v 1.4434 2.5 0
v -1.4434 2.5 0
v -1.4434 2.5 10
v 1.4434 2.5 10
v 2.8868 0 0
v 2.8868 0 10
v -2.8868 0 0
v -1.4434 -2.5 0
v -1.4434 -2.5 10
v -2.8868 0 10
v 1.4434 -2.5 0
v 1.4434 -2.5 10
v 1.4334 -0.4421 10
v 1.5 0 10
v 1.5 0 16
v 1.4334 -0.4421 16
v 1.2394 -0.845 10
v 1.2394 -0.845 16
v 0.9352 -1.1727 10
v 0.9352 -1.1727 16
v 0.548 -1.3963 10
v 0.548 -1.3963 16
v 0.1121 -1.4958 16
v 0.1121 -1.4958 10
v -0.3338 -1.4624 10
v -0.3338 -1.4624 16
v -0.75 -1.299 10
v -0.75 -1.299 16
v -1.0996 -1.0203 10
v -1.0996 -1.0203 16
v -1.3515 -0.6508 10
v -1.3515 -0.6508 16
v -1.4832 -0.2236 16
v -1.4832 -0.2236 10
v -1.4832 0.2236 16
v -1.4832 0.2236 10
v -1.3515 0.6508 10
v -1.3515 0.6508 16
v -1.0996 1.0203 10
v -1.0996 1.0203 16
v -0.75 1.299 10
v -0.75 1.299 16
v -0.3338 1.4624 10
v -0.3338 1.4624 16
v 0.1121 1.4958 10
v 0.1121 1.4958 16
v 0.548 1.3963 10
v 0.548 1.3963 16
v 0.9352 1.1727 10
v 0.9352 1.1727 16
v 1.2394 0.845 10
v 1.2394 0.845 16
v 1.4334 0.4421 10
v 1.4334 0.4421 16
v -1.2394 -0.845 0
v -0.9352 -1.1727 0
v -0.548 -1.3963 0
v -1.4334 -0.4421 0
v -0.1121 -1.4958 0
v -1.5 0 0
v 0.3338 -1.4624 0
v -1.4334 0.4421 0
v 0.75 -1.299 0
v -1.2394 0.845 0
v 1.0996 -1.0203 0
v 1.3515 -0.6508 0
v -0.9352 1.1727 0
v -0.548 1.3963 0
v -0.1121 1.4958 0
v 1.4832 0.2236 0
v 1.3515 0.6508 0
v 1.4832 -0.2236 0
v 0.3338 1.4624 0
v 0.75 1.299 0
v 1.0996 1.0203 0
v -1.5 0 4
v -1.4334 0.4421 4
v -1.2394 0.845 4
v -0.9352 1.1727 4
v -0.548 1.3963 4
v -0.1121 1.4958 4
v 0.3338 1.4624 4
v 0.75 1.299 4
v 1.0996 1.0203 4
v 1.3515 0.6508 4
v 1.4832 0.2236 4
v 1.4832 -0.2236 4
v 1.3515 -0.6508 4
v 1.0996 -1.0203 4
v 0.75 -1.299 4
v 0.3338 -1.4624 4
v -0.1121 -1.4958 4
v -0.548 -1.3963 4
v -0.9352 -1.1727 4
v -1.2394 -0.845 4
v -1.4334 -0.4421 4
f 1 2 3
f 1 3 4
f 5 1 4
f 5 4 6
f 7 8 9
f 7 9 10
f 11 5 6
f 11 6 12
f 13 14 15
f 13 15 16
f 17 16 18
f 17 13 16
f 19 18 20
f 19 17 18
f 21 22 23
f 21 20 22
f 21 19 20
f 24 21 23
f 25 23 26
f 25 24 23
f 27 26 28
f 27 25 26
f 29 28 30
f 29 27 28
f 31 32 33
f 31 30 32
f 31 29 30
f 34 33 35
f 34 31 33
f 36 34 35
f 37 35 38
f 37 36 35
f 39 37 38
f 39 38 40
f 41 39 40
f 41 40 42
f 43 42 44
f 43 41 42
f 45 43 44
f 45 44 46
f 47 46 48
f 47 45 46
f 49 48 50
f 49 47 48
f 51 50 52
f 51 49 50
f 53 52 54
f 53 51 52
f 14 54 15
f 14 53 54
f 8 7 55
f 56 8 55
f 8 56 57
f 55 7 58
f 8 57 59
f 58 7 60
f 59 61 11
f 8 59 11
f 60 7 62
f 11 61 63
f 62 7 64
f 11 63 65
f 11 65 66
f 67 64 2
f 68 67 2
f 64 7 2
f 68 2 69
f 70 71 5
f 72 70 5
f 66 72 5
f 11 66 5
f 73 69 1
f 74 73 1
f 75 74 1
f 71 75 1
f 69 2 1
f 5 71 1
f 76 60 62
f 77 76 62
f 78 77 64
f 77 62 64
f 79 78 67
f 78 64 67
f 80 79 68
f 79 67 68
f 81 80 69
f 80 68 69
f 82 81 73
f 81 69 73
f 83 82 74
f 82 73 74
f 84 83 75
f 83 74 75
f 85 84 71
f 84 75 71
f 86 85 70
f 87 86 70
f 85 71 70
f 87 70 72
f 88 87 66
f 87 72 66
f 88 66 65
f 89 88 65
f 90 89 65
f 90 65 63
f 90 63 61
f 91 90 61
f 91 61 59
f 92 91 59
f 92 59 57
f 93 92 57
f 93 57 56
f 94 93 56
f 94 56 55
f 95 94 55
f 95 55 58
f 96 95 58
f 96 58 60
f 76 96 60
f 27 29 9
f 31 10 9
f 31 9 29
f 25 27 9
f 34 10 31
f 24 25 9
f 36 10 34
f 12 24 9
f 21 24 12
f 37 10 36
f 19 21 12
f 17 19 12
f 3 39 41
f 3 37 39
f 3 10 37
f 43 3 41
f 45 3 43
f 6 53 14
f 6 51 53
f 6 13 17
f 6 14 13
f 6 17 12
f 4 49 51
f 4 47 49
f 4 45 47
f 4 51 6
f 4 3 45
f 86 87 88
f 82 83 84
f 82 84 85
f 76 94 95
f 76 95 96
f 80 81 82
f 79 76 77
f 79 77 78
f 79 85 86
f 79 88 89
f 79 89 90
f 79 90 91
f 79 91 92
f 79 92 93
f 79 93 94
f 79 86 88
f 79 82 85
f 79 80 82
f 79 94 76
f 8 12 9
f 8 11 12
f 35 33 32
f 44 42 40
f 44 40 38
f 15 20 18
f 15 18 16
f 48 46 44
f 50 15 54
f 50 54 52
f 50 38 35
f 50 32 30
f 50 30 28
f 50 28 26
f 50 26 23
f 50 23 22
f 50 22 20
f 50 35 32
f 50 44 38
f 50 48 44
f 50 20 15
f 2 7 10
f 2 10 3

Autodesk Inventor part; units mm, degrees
ref_plane "YZ Plane" through (0, 0, 0) normal (1, 0, 0) x (0, 1, 0)
ref_plane "XZ Plane" through (0, 0, 0) normal (0, 1, 0) x (-1, 0, 0)
ref_plane "XY Plane" through (0, 0, 0) normal (0, 0, 1) x (1, 0, 0)
sketch "Sketch1" plane through (0, 0, 0) normal (0, 0, 1) x (1, 0, 0)
  line L0 (2.8868, 0) -> (1.4434, -2.5)
  line L1 (1.4434, -2.5) -> (-1.4434, -2.5)
  line L2 (-1.4434, -2.5) -> (-2.8868, 0)
  line L3 (-2.8868, 0) -> (-1.4434, 2.5)
  line L4 (-1.4434, 2.5) -> (1.4434, 2.5)
  line L5 (1.4434, 2.5) -> (2.8868, 0)
  point P0 (0, 0)
  point P1 (0, 0)
  dimension "d0" = 5
extrude "Extrusion1" add sketch "Sketch1" along normal blind 10
sketch "Sketch2" plane through (0, 0, 10) normal (0, 0, 1) x (1, 0, 0)
  circle A0 centre (0, 0) radius 1.5
  dimension "d3" = 3
extrude "Extrusion2" add sketch "Sketch2" along normal blind 6
sketch "Sketch3" plane through (0, 0, 0) normal (0, 0, -1) x (-1, 0, 0)
  circle A0 centre (0, 0) radius 1.5
  dimension "d6" = 3
extrude "Extrusion3" cut sketch "Sketch3" against normal blind 4
properties part number "Spacer7mm_m3"
